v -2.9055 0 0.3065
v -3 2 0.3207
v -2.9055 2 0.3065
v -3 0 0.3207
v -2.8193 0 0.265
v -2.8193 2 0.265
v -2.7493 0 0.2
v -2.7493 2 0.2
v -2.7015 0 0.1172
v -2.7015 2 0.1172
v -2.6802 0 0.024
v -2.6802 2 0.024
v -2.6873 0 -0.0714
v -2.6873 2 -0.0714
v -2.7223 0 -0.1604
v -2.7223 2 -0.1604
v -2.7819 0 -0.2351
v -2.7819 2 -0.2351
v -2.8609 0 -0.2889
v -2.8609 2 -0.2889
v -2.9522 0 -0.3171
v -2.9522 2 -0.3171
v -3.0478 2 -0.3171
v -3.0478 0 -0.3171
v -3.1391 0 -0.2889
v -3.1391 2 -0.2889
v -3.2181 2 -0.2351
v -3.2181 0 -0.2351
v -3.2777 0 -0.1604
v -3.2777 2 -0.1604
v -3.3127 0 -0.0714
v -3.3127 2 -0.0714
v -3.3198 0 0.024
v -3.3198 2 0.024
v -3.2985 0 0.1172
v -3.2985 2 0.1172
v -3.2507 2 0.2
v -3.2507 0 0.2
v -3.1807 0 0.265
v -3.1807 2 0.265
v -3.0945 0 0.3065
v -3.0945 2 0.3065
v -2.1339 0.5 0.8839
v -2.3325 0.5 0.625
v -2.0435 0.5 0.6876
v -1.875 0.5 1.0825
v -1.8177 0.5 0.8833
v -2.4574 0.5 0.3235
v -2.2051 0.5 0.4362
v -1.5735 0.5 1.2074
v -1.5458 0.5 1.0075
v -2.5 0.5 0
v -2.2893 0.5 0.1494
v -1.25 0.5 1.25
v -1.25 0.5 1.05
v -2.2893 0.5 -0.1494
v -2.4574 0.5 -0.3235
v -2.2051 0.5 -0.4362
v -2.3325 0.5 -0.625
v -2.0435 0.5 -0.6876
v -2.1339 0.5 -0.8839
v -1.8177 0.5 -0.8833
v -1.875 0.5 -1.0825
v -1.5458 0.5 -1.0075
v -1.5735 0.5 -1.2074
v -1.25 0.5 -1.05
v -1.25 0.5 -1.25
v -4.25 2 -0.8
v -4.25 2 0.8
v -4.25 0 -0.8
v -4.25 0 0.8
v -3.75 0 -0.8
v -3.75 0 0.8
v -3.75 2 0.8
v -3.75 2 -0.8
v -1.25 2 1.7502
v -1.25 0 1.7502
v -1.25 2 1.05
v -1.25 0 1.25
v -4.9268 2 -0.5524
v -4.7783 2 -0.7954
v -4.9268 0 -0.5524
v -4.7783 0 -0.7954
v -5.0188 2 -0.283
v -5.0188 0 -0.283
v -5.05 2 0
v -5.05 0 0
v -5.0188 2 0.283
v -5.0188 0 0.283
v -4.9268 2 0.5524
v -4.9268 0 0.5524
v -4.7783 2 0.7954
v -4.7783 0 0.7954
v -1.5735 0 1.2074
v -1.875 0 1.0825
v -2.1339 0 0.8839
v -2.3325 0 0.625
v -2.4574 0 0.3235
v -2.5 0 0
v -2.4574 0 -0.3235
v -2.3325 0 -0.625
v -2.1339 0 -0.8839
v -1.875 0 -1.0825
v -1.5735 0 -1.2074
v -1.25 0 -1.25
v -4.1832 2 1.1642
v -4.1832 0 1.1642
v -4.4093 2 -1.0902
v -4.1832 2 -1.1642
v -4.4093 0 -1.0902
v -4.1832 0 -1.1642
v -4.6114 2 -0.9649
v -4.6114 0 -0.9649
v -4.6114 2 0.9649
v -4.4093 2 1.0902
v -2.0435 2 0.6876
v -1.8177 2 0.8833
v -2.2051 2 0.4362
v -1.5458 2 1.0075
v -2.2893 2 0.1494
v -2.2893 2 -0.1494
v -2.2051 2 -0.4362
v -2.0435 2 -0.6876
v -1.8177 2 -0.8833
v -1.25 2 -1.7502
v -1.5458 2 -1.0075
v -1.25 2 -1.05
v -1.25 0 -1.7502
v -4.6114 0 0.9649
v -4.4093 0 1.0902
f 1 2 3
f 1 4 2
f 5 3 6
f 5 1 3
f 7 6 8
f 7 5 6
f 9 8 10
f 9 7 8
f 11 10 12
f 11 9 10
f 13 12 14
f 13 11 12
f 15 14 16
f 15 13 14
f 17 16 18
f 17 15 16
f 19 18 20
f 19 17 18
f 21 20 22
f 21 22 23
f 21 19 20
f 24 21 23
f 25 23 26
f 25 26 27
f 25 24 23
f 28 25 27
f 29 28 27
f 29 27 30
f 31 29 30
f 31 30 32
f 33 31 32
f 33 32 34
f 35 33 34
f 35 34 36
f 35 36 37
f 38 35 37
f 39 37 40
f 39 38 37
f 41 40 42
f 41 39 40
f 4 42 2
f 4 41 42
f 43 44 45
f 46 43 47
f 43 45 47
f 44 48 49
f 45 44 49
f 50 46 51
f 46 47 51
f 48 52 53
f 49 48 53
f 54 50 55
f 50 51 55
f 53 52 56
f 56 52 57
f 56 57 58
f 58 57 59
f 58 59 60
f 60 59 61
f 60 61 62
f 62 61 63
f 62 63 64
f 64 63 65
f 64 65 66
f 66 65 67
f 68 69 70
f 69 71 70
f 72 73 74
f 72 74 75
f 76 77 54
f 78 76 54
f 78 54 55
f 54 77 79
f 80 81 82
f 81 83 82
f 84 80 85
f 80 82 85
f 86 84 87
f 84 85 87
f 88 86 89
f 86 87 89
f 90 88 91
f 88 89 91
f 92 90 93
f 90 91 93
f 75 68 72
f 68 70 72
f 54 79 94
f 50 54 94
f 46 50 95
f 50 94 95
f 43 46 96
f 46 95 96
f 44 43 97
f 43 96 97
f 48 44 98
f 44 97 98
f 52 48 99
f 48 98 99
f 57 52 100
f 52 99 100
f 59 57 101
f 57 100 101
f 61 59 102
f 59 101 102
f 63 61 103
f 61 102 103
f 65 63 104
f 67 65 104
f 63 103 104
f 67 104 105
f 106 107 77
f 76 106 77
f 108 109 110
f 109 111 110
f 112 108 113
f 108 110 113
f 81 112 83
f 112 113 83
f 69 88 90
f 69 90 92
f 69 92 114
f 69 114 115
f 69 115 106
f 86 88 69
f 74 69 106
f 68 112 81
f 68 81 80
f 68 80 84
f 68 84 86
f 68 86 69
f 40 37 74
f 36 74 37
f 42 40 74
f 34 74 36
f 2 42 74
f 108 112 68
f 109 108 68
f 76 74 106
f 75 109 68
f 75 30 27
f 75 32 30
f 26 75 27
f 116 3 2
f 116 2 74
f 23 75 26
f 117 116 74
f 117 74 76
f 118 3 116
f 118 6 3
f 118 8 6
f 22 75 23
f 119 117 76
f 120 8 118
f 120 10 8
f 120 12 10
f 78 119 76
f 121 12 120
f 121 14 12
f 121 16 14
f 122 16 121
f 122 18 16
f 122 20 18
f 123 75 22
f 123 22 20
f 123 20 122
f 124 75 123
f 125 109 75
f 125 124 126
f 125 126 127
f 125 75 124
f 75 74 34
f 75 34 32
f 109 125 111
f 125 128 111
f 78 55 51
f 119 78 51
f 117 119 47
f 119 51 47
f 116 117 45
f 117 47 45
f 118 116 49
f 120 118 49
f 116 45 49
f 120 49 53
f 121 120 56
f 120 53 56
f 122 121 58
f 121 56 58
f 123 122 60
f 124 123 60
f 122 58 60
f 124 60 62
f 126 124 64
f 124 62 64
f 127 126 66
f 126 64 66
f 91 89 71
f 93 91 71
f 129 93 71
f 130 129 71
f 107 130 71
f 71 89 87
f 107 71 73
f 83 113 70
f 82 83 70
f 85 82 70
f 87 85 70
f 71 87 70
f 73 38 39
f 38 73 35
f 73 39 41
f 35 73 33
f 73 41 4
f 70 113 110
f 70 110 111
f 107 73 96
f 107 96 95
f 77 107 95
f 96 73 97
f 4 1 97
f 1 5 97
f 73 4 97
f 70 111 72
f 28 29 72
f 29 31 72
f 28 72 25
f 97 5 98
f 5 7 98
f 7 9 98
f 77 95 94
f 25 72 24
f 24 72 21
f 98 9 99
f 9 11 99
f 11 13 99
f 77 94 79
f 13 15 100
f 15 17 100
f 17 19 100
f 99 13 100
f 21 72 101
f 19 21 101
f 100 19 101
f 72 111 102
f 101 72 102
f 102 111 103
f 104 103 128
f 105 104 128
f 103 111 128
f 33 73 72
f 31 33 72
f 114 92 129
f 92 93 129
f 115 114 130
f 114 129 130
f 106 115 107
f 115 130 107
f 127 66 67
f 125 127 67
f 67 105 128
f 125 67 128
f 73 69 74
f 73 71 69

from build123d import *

# Parameters (mm, degrees)
SKETCH1_W           = 0.5
SKETCH1_H           = 1.6
SKETCH1_R           = 0.3207
BOSS_EXTRUDE1_DEPTH = 0.5
BOSS_EXTRUDE2_START = 0.5
SKETCH1_20_W        = 0.5
SKETCH1_20_H        = 1.6
SKETCH1_20_R        = 0.3207
BOSS_EXTRUDE2_DEPTH = 1.5


with BuildPart() as part:
    # Sketch1 → Boss-Extrude1 (new body)
    with BuildSketch(Plane(origin=(0, 0, 0), x_dir=(1, 0, 0), z_dir=(0, 1, 0))):
        with BuildLine():
            Line((-1.25, 1.25), (-1.25, 1.750241174))
            Line((-1.25, 1.750241174), (-4.183235691, 1.164159973))
            ThreePointArc((-4.183235691, 1.164159973), (-4.514100231, 1.033532975), (-4.77830642, 0.795352694))
            ThreePointArc((-4.77830642, 0.795352694), (-5.05, 0), (-4.77830642, -0.795352694))
            ThreePointArc((-4.77830642, -0.795352694), (-4.514100231, -1.033532975), (-4.183235691, -1.164159973))
            Line((-4.183235691, -1.164159973), (-1.25, -1.750241174))
            Line((-1.25, -1.750241174), (-1.25, -1.25))
            ThreePointArc((-1.25, -1.25), (-2.5, 0), (-1.25, 1.25))
        make_face()
        with Locations((-4, 0)):
            Rectangle(SKETCH1_W, SKETCH1_H, mode=Mode.SUBTRACT)
        with Locations((-3, 0)):
            Circle(SKETCH1_R, mode=Mode.SUBTRACT)
    extrude(amount=BOSS_EXTRUDE1_DEPTH)

    # Sketch1<20> → Boss-Extrude2 (add)
    with BuildSketch(Plane(origin=(0, 0, 0), x_dir=(1, 0, 0), z_dir=(0, 1, 0)).offset(BOSS_EXTRUDE2_START)):
        with BuildLine():
            Line((-1.25, 1.750241174), (-4.183235691, 1.164159973))
            ThreePointArc((-4.183235691, 1.164159973), (-4.514100231, 1.033532975), (-4.77830642, 0.795352694))
            ThreePointArc((-4.77830642, 0.795352694), (-5.05, 0), (-4.77830642, -0.795352694))
            ThreePointArc((-4.77830642, -0.795352694), (-4.514100231, -1.033532975), (-4.183235691, -1.164159973))
            Line((-4.183235691, -1.164159973), (-1.25, -1.750241174))
            Line((-1.25, -1.750241174), (-1.25, -1.05))
            ThreePointArc((-1.25, -1.05), (-2.3, 0), (-1.25, 1.05))
            Line((-1.25, 1.05), (-1.25, 1.750241174))
        make_face()
        with Locations((-4, 0)):
            Rectangle(SKETCH1_20_W, SKETCH1_20_H, mode=Mode.SUBTRACT)
        with Locations((-3, 0)):
            Circle(SKETCH1_20_R, mode=Mode.SUBTRACT)
    extrude(amount=BOSS_EXTRUDE2_DEPTH)


solid = part.part
